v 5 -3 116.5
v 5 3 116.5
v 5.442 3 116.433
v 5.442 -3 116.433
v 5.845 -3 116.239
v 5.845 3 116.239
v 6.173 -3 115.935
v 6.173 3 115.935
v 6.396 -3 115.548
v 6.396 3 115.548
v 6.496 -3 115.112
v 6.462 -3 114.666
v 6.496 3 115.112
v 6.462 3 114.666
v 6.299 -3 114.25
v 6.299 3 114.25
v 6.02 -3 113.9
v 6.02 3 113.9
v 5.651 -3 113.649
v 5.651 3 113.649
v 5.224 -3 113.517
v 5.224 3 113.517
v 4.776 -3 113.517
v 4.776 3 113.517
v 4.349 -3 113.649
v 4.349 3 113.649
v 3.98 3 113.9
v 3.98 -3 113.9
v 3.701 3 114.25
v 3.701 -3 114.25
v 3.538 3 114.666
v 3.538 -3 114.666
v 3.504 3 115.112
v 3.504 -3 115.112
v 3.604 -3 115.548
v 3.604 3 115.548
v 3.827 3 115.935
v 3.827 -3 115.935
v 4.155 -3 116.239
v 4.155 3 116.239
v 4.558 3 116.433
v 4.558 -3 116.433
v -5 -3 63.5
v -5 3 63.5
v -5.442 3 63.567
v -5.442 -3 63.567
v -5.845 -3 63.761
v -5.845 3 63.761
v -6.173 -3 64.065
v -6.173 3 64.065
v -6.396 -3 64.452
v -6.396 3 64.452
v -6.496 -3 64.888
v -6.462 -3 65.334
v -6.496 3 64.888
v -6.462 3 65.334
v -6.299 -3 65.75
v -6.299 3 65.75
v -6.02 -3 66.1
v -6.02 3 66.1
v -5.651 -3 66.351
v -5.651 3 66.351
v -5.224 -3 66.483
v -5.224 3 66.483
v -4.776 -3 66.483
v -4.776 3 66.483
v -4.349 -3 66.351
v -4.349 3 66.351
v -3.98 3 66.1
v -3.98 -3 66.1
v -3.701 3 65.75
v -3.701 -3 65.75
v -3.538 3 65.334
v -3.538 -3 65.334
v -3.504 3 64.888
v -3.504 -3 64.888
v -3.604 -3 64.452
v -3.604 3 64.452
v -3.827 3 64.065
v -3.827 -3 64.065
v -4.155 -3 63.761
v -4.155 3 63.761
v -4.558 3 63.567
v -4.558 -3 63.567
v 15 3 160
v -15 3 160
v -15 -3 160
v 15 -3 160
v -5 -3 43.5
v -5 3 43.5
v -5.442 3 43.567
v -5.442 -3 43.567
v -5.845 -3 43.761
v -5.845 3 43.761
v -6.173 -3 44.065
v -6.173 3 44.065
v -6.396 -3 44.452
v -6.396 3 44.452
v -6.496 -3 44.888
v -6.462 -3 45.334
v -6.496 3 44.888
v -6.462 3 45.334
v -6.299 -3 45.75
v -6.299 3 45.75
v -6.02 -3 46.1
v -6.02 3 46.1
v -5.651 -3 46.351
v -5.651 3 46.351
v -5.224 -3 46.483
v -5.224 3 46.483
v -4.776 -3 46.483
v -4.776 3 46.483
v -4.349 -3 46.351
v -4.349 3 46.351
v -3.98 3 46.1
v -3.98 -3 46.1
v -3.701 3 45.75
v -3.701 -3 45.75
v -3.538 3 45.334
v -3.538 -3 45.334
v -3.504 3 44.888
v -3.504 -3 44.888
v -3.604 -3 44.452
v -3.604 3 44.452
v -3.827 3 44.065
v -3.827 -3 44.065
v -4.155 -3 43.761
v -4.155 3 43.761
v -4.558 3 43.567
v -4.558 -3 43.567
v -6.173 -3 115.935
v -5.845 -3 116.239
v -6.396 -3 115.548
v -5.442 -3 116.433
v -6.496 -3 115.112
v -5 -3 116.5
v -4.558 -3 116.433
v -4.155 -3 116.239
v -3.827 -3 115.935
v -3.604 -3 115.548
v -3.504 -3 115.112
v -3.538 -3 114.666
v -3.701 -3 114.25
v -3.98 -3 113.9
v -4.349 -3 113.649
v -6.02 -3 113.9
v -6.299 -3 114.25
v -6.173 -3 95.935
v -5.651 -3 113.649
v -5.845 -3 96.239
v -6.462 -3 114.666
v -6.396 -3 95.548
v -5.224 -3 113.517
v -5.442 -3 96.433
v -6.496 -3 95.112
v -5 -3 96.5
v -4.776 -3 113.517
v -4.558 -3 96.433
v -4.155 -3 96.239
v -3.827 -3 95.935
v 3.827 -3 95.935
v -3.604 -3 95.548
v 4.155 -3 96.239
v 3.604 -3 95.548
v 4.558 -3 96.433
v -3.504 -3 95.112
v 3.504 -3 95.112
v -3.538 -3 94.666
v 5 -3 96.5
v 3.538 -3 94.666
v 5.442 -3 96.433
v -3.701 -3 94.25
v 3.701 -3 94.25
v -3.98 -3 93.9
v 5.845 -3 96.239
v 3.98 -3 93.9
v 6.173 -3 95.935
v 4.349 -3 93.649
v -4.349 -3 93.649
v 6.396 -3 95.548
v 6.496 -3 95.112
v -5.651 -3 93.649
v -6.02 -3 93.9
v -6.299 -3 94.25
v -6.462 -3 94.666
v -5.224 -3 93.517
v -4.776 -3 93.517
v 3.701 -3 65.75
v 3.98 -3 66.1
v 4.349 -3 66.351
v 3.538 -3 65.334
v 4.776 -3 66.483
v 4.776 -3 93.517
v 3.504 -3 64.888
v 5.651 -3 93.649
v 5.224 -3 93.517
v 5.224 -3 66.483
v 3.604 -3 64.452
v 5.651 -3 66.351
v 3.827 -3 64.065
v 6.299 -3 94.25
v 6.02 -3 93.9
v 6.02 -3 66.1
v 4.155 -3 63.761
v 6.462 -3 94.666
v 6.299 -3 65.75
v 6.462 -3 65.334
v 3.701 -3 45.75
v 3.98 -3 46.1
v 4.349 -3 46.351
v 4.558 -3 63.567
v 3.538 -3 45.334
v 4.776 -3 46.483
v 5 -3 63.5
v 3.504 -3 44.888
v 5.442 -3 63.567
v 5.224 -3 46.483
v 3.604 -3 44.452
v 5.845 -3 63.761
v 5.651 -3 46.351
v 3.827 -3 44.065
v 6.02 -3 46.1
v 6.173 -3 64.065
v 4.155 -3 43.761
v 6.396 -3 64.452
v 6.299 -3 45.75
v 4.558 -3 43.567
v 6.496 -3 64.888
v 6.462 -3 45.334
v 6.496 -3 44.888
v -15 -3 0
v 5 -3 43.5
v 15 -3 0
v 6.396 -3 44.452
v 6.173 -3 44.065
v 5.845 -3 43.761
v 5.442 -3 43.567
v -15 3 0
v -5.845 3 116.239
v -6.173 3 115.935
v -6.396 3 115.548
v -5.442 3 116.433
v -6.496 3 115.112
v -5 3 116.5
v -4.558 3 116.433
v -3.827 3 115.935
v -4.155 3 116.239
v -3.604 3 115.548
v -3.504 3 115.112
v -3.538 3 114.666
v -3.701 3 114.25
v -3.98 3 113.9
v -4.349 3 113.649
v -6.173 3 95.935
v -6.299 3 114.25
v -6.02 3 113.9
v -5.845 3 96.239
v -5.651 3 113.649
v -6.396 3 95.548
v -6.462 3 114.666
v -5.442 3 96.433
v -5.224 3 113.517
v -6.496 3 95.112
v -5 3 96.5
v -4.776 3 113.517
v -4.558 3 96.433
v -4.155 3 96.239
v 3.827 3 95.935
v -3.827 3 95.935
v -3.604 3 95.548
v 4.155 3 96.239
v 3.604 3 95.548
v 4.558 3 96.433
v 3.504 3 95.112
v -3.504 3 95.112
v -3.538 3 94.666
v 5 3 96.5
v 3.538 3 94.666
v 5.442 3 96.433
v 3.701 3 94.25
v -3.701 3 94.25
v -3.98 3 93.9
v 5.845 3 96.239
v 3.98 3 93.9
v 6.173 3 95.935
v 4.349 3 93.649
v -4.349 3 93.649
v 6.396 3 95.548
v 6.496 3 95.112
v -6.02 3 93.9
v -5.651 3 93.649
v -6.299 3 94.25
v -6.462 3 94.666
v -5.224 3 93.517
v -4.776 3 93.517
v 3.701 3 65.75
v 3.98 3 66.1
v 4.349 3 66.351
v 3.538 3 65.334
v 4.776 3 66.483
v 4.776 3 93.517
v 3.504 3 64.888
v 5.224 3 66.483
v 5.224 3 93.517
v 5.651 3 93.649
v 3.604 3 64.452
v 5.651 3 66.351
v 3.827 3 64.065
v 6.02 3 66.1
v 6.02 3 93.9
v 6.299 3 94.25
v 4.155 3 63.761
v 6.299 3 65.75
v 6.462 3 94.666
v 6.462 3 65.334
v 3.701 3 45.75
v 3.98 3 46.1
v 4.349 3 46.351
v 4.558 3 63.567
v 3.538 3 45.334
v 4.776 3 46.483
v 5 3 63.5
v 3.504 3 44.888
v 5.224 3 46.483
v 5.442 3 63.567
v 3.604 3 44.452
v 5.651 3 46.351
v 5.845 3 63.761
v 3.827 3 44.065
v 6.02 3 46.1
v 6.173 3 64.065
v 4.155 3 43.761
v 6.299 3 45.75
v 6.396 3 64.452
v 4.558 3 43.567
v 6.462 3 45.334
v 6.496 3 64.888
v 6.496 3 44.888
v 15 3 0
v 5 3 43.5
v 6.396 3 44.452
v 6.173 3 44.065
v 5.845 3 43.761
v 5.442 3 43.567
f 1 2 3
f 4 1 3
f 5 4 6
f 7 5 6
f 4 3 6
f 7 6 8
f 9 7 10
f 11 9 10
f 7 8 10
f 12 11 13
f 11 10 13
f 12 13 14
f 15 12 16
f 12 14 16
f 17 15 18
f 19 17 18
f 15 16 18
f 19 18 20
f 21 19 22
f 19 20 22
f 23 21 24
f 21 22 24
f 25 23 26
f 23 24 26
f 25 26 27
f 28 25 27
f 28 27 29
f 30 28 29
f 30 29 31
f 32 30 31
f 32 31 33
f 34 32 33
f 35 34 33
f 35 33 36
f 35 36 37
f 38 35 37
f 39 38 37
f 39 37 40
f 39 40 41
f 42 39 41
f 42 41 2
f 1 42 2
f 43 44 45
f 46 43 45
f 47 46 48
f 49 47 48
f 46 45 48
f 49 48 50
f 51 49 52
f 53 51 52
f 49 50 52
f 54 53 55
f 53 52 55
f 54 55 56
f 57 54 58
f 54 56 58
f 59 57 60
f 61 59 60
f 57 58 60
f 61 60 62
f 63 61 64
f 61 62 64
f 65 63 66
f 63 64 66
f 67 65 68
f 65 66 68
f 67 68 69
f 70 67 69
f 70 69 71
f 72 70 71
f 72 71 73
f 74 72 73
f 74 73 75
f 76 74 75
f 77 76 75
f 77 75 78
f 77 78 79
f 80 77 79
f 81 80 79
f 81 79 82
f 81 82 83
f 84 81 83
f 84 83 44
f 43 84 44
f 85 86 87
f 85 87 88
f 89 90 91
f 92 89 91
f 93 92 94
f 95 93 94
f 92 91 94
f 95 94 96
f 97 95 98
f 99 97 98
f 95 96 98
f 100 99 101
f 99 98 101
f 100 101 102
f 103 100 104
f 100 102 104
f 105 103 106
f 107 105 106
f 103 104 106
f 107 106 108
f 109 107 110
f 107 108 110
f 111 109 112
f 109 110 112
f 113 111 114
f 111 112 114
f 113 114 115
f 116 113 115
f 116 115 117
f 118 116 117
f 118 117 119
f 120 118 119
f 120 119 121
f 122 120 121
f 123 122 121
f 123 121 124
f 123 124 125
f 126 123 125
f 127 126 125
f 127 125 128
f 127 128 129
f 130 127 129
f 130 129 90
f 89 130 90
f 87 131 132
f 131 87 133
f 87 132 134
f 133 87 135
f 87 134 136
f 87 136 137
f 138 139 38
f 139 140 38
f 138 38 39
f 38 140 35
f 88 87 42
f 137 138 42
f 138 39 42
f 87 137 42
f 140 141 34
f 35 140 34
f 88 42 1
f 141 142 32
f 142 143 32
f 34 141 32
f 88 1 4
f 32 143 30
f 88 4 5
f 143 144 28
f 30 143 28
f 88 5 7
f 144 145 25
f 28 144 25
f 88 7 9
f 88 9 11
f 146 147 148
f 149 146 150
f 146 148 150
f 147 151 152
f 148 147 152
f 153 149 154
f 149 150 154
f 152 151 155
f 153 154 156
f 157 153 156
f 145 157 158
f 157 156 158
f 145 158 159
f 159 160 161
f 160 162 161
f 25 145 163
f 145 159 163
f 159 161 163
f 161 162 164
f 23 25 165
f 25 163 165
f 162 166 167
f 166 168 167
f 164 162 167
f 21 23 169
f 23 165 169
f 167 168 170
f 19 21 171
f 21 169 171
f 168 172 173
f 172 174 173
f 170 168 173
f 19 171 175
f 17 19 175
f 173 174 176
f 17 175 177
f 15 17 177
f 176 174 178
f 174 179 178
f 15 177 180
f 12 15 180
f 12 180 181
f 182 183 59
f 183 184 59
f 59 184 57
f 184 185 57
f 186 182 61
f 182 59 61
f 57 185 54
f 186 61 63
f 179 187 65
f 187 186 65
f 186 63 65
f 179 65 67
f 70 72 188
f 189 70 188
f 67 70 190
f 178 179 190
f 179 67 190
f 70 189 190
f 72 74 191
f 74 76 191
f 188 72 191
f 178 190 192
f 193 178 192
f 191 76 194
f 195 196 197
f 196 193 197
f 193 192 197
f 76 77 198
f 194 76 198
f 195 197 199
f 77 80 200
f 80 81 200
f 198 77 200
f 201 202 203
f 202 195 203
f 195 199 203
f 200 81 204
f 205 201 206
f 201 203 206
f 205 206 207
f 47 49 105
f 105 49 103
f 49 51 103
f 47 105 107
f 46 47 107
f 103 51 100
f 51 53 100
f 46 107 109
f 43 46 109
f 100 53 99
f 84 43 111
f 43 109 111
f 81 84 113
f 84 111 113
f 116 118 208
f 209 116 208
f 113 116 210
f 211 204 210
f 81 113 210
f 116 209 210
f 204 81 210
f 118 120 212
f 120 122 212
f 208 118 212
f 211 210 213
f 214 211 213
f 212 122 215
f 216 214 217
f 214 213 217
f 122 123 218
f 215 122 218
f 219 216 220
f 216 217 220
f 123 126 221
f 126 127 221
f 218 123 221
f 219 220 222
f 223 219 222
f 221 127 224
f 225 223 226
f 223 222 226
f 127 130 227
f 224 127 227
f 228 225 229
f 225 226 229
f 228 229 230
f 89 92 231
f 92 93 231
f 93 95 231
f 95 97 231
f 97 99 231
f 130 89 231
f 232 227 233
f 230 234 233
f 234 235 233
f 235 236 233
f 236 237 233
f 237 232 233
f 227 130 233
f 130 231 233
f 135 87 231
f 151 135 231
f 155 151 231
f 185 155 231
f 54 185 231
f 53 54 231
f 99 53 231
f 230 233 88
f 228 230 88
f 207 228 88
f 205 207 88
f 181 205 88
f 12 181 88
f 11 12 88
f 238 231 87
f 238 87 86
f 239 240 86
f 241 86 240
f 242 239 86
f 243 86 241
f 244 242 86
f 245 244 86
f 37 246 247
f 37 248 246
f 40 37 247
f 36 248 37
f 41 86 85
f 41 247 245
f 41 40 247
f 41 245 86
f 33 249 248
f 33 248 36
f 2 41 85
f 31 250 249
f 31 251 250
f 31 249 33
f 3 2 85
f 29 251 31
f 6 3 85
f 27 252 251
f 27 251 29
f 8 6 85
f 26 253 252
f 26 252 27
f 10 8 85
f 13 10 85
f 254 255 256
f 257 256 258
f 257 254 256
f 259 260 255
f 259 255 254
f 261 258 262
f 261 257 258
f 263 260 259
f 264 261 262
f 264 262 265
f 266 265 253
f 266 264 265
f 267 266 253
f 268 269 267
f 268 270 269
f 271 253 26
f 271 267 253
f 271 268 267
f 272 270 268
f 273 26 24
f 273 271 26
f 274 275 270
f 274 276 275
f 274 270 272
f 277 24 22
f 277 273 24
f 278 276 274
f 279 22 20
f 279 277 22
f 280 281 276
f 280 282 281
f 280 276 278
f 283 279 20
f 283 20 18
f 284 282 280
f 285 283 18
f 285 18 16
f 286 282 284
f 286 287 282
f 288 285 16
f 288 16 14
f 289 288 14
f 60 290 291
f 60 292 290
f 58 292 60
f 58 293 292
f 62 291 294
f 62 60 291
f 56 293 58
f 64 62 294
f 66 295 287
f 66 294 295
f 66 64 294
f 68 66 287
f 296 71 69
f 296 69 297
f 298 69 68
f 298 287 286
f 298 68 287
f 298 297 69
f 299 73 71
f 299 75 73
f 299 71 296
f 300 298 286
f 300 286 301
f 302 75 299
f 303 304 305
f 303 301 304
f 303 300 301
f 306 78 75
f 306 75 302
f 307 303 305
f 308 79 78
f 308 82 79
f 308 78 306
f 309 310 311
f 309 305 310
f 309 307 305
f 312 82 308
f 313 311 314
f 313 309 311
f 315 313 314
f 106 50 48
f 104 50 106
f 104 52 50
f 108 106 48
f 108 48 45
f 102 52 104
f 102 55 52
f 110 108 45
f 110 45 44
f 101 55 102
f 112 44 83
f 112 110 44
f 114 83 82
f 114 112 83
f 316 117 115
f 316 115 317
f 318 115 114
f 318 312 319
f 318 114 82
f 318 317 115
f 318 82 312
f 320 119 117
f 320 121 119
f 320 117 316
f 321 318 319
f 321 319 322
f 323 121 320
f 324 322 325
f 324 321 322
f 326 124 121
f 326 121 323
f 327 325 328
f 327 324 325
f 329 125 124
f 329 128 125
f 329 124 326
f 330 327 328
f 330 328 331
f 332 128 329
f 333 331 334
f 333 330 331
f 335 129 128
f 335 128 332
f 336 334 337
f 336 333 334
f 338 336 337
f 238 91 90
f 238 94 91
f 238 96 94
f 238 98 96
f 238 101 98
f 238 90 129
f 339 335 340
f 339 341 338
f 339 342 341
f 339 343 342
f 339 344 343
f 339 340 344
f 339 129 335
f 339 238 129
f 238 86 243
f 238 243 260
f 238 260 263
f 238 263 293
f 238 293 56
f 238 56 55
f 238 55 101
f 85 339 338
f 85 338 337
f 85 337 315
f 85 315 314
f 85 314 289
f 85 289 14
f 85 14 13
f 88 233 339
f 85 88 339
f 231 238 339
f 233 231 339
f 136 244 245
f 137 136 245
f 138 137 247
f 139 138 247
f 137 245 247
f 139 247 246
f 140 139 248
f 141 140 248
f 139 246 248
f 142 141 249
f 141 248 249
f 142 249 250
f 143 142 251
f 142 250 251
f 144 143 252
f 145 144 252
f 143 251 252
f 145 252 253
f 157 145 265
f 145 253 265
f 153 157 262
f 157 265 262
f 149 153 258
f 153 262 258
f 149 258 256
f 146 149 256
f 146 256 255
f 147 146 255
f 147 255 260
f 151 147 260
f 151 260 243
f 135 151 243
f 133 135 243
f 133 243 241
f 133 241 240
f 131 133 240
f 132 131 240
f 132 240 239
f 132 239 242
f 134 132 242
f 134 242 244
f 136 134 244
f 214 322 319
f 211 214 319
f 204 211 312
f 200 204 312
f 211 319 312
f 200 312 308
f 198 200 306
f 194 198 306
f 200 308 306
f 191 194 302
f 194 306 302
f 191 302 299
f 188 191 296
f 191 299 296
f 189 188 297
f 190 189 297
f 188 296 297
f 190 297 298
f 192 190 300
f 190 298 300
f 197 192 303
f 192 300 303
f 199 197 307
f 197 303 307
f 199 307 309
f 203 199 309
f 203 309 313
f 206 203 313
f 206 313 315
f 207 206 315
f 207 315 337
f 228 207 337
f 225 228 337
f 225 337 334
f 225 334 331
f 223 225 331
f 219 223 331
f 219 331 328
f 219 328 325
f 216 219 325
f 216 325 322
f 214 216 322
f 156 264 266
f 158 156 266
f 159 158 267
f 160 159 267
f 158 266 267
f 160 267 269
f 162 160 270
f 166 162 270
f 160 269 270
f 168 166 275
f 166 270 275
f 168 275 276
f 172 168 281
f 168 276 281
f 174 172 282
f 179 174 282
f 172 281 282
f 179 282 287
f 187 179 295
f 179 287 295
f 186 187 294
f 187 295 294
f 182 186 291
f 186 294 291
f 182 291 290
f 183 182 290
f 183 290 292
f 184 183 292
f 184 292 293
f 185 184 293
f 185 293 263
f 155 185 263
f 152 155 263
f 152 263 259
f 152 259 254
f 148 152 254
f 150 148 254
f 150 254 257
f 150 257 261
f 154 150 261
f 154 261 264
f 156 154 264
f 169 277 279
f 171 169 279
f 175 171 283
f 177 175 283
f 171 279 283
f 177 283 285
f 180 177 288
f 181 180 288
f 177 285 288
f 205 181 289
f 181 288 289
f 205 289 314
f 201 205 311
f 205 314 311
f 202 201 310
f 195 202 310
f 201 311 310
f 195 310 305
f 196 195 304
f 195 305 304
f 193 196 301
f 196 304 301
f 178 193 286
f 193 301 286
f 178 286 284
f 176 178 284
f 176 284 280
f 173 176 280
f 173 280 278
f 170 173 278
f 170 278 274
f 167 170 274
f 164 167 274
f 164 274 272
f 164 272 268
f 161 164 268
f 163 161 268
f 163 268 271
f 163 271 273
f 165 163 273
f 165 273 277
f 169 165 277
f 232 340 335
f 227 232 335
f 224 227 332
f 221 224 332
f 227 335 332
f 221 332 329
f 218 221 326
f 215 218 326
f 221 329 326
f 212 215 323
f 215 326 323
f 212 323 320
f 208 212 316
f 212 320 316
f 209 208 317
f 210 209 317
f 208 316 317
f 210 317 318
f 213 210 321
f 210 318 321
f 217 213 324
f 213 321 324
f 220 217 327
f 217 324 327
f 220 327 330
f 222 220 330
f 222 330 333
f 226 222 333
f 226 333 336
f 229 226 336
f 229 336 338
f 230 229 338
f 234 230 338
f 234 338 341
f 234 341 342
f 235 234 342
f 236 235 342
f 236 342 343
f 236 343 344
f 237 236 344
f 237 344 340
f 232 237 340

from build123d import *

# Parameters (mm, degrees)
SKETCH2_W           = 30
SKETCH2_H           = 6
BOSS_EXTRUDE1_DEPTH = 160
SKETCH3_R           = 1.5
CUT_EXTRUDE3_DEPTH  = 161.813556642


with BuildPart() as part:
    # Sketch2 → Boss-Extrude1 (new body)
    with BuildSketch(Plane.XY):
        Rectangle(SKETCH2_W, SKETCH2_H)
    extrude(amount=BOSS_EXTRUDE1_DEPTH)

    # Sketch3 → Cut-Extrude3 (cut, through all)
    with BuildSketch(Plane(origin=(0, 3, 0), x_dir=(1, 0, 0), z_dir=(0, 1, 0))):
        with Locations(Location((-5, -115, 0), (0, 0, 270))):
            Circle(SKETCH3_R)
        with Locations(Location((5, -115, 0), (0, 0, 270))):
            Circle(SKETCH3_R)
        with Locations(Location((5, -95, 0), (0, 0, 270))):
            Circle(SKETCH3_R)
        with Locations(Location((-5, -95, 0), (0, 0, 270))):
            Circle(SKETCH3_R)
        with Locations(Location((-5, -65, 0), (0, 0, 90))):
            Circle(SKETCH3_R)
        with Locations(Location((5, -65, 0), (0, 0, 90))):
            Circle(SKETCH3_R)
        with Locations(Location((5, -45, 0), (0, 0, 90))):
            Circle(SKETCH3_R)
        with Locations(Location((-5, -45, 0), (0, 0, 90))):
            Circle(SKETCH3_R)
    extrude(amount=-CUT_EXTRUDE3_DEPTH, mode=Mode.SUBTRACT)


solid = part.part
